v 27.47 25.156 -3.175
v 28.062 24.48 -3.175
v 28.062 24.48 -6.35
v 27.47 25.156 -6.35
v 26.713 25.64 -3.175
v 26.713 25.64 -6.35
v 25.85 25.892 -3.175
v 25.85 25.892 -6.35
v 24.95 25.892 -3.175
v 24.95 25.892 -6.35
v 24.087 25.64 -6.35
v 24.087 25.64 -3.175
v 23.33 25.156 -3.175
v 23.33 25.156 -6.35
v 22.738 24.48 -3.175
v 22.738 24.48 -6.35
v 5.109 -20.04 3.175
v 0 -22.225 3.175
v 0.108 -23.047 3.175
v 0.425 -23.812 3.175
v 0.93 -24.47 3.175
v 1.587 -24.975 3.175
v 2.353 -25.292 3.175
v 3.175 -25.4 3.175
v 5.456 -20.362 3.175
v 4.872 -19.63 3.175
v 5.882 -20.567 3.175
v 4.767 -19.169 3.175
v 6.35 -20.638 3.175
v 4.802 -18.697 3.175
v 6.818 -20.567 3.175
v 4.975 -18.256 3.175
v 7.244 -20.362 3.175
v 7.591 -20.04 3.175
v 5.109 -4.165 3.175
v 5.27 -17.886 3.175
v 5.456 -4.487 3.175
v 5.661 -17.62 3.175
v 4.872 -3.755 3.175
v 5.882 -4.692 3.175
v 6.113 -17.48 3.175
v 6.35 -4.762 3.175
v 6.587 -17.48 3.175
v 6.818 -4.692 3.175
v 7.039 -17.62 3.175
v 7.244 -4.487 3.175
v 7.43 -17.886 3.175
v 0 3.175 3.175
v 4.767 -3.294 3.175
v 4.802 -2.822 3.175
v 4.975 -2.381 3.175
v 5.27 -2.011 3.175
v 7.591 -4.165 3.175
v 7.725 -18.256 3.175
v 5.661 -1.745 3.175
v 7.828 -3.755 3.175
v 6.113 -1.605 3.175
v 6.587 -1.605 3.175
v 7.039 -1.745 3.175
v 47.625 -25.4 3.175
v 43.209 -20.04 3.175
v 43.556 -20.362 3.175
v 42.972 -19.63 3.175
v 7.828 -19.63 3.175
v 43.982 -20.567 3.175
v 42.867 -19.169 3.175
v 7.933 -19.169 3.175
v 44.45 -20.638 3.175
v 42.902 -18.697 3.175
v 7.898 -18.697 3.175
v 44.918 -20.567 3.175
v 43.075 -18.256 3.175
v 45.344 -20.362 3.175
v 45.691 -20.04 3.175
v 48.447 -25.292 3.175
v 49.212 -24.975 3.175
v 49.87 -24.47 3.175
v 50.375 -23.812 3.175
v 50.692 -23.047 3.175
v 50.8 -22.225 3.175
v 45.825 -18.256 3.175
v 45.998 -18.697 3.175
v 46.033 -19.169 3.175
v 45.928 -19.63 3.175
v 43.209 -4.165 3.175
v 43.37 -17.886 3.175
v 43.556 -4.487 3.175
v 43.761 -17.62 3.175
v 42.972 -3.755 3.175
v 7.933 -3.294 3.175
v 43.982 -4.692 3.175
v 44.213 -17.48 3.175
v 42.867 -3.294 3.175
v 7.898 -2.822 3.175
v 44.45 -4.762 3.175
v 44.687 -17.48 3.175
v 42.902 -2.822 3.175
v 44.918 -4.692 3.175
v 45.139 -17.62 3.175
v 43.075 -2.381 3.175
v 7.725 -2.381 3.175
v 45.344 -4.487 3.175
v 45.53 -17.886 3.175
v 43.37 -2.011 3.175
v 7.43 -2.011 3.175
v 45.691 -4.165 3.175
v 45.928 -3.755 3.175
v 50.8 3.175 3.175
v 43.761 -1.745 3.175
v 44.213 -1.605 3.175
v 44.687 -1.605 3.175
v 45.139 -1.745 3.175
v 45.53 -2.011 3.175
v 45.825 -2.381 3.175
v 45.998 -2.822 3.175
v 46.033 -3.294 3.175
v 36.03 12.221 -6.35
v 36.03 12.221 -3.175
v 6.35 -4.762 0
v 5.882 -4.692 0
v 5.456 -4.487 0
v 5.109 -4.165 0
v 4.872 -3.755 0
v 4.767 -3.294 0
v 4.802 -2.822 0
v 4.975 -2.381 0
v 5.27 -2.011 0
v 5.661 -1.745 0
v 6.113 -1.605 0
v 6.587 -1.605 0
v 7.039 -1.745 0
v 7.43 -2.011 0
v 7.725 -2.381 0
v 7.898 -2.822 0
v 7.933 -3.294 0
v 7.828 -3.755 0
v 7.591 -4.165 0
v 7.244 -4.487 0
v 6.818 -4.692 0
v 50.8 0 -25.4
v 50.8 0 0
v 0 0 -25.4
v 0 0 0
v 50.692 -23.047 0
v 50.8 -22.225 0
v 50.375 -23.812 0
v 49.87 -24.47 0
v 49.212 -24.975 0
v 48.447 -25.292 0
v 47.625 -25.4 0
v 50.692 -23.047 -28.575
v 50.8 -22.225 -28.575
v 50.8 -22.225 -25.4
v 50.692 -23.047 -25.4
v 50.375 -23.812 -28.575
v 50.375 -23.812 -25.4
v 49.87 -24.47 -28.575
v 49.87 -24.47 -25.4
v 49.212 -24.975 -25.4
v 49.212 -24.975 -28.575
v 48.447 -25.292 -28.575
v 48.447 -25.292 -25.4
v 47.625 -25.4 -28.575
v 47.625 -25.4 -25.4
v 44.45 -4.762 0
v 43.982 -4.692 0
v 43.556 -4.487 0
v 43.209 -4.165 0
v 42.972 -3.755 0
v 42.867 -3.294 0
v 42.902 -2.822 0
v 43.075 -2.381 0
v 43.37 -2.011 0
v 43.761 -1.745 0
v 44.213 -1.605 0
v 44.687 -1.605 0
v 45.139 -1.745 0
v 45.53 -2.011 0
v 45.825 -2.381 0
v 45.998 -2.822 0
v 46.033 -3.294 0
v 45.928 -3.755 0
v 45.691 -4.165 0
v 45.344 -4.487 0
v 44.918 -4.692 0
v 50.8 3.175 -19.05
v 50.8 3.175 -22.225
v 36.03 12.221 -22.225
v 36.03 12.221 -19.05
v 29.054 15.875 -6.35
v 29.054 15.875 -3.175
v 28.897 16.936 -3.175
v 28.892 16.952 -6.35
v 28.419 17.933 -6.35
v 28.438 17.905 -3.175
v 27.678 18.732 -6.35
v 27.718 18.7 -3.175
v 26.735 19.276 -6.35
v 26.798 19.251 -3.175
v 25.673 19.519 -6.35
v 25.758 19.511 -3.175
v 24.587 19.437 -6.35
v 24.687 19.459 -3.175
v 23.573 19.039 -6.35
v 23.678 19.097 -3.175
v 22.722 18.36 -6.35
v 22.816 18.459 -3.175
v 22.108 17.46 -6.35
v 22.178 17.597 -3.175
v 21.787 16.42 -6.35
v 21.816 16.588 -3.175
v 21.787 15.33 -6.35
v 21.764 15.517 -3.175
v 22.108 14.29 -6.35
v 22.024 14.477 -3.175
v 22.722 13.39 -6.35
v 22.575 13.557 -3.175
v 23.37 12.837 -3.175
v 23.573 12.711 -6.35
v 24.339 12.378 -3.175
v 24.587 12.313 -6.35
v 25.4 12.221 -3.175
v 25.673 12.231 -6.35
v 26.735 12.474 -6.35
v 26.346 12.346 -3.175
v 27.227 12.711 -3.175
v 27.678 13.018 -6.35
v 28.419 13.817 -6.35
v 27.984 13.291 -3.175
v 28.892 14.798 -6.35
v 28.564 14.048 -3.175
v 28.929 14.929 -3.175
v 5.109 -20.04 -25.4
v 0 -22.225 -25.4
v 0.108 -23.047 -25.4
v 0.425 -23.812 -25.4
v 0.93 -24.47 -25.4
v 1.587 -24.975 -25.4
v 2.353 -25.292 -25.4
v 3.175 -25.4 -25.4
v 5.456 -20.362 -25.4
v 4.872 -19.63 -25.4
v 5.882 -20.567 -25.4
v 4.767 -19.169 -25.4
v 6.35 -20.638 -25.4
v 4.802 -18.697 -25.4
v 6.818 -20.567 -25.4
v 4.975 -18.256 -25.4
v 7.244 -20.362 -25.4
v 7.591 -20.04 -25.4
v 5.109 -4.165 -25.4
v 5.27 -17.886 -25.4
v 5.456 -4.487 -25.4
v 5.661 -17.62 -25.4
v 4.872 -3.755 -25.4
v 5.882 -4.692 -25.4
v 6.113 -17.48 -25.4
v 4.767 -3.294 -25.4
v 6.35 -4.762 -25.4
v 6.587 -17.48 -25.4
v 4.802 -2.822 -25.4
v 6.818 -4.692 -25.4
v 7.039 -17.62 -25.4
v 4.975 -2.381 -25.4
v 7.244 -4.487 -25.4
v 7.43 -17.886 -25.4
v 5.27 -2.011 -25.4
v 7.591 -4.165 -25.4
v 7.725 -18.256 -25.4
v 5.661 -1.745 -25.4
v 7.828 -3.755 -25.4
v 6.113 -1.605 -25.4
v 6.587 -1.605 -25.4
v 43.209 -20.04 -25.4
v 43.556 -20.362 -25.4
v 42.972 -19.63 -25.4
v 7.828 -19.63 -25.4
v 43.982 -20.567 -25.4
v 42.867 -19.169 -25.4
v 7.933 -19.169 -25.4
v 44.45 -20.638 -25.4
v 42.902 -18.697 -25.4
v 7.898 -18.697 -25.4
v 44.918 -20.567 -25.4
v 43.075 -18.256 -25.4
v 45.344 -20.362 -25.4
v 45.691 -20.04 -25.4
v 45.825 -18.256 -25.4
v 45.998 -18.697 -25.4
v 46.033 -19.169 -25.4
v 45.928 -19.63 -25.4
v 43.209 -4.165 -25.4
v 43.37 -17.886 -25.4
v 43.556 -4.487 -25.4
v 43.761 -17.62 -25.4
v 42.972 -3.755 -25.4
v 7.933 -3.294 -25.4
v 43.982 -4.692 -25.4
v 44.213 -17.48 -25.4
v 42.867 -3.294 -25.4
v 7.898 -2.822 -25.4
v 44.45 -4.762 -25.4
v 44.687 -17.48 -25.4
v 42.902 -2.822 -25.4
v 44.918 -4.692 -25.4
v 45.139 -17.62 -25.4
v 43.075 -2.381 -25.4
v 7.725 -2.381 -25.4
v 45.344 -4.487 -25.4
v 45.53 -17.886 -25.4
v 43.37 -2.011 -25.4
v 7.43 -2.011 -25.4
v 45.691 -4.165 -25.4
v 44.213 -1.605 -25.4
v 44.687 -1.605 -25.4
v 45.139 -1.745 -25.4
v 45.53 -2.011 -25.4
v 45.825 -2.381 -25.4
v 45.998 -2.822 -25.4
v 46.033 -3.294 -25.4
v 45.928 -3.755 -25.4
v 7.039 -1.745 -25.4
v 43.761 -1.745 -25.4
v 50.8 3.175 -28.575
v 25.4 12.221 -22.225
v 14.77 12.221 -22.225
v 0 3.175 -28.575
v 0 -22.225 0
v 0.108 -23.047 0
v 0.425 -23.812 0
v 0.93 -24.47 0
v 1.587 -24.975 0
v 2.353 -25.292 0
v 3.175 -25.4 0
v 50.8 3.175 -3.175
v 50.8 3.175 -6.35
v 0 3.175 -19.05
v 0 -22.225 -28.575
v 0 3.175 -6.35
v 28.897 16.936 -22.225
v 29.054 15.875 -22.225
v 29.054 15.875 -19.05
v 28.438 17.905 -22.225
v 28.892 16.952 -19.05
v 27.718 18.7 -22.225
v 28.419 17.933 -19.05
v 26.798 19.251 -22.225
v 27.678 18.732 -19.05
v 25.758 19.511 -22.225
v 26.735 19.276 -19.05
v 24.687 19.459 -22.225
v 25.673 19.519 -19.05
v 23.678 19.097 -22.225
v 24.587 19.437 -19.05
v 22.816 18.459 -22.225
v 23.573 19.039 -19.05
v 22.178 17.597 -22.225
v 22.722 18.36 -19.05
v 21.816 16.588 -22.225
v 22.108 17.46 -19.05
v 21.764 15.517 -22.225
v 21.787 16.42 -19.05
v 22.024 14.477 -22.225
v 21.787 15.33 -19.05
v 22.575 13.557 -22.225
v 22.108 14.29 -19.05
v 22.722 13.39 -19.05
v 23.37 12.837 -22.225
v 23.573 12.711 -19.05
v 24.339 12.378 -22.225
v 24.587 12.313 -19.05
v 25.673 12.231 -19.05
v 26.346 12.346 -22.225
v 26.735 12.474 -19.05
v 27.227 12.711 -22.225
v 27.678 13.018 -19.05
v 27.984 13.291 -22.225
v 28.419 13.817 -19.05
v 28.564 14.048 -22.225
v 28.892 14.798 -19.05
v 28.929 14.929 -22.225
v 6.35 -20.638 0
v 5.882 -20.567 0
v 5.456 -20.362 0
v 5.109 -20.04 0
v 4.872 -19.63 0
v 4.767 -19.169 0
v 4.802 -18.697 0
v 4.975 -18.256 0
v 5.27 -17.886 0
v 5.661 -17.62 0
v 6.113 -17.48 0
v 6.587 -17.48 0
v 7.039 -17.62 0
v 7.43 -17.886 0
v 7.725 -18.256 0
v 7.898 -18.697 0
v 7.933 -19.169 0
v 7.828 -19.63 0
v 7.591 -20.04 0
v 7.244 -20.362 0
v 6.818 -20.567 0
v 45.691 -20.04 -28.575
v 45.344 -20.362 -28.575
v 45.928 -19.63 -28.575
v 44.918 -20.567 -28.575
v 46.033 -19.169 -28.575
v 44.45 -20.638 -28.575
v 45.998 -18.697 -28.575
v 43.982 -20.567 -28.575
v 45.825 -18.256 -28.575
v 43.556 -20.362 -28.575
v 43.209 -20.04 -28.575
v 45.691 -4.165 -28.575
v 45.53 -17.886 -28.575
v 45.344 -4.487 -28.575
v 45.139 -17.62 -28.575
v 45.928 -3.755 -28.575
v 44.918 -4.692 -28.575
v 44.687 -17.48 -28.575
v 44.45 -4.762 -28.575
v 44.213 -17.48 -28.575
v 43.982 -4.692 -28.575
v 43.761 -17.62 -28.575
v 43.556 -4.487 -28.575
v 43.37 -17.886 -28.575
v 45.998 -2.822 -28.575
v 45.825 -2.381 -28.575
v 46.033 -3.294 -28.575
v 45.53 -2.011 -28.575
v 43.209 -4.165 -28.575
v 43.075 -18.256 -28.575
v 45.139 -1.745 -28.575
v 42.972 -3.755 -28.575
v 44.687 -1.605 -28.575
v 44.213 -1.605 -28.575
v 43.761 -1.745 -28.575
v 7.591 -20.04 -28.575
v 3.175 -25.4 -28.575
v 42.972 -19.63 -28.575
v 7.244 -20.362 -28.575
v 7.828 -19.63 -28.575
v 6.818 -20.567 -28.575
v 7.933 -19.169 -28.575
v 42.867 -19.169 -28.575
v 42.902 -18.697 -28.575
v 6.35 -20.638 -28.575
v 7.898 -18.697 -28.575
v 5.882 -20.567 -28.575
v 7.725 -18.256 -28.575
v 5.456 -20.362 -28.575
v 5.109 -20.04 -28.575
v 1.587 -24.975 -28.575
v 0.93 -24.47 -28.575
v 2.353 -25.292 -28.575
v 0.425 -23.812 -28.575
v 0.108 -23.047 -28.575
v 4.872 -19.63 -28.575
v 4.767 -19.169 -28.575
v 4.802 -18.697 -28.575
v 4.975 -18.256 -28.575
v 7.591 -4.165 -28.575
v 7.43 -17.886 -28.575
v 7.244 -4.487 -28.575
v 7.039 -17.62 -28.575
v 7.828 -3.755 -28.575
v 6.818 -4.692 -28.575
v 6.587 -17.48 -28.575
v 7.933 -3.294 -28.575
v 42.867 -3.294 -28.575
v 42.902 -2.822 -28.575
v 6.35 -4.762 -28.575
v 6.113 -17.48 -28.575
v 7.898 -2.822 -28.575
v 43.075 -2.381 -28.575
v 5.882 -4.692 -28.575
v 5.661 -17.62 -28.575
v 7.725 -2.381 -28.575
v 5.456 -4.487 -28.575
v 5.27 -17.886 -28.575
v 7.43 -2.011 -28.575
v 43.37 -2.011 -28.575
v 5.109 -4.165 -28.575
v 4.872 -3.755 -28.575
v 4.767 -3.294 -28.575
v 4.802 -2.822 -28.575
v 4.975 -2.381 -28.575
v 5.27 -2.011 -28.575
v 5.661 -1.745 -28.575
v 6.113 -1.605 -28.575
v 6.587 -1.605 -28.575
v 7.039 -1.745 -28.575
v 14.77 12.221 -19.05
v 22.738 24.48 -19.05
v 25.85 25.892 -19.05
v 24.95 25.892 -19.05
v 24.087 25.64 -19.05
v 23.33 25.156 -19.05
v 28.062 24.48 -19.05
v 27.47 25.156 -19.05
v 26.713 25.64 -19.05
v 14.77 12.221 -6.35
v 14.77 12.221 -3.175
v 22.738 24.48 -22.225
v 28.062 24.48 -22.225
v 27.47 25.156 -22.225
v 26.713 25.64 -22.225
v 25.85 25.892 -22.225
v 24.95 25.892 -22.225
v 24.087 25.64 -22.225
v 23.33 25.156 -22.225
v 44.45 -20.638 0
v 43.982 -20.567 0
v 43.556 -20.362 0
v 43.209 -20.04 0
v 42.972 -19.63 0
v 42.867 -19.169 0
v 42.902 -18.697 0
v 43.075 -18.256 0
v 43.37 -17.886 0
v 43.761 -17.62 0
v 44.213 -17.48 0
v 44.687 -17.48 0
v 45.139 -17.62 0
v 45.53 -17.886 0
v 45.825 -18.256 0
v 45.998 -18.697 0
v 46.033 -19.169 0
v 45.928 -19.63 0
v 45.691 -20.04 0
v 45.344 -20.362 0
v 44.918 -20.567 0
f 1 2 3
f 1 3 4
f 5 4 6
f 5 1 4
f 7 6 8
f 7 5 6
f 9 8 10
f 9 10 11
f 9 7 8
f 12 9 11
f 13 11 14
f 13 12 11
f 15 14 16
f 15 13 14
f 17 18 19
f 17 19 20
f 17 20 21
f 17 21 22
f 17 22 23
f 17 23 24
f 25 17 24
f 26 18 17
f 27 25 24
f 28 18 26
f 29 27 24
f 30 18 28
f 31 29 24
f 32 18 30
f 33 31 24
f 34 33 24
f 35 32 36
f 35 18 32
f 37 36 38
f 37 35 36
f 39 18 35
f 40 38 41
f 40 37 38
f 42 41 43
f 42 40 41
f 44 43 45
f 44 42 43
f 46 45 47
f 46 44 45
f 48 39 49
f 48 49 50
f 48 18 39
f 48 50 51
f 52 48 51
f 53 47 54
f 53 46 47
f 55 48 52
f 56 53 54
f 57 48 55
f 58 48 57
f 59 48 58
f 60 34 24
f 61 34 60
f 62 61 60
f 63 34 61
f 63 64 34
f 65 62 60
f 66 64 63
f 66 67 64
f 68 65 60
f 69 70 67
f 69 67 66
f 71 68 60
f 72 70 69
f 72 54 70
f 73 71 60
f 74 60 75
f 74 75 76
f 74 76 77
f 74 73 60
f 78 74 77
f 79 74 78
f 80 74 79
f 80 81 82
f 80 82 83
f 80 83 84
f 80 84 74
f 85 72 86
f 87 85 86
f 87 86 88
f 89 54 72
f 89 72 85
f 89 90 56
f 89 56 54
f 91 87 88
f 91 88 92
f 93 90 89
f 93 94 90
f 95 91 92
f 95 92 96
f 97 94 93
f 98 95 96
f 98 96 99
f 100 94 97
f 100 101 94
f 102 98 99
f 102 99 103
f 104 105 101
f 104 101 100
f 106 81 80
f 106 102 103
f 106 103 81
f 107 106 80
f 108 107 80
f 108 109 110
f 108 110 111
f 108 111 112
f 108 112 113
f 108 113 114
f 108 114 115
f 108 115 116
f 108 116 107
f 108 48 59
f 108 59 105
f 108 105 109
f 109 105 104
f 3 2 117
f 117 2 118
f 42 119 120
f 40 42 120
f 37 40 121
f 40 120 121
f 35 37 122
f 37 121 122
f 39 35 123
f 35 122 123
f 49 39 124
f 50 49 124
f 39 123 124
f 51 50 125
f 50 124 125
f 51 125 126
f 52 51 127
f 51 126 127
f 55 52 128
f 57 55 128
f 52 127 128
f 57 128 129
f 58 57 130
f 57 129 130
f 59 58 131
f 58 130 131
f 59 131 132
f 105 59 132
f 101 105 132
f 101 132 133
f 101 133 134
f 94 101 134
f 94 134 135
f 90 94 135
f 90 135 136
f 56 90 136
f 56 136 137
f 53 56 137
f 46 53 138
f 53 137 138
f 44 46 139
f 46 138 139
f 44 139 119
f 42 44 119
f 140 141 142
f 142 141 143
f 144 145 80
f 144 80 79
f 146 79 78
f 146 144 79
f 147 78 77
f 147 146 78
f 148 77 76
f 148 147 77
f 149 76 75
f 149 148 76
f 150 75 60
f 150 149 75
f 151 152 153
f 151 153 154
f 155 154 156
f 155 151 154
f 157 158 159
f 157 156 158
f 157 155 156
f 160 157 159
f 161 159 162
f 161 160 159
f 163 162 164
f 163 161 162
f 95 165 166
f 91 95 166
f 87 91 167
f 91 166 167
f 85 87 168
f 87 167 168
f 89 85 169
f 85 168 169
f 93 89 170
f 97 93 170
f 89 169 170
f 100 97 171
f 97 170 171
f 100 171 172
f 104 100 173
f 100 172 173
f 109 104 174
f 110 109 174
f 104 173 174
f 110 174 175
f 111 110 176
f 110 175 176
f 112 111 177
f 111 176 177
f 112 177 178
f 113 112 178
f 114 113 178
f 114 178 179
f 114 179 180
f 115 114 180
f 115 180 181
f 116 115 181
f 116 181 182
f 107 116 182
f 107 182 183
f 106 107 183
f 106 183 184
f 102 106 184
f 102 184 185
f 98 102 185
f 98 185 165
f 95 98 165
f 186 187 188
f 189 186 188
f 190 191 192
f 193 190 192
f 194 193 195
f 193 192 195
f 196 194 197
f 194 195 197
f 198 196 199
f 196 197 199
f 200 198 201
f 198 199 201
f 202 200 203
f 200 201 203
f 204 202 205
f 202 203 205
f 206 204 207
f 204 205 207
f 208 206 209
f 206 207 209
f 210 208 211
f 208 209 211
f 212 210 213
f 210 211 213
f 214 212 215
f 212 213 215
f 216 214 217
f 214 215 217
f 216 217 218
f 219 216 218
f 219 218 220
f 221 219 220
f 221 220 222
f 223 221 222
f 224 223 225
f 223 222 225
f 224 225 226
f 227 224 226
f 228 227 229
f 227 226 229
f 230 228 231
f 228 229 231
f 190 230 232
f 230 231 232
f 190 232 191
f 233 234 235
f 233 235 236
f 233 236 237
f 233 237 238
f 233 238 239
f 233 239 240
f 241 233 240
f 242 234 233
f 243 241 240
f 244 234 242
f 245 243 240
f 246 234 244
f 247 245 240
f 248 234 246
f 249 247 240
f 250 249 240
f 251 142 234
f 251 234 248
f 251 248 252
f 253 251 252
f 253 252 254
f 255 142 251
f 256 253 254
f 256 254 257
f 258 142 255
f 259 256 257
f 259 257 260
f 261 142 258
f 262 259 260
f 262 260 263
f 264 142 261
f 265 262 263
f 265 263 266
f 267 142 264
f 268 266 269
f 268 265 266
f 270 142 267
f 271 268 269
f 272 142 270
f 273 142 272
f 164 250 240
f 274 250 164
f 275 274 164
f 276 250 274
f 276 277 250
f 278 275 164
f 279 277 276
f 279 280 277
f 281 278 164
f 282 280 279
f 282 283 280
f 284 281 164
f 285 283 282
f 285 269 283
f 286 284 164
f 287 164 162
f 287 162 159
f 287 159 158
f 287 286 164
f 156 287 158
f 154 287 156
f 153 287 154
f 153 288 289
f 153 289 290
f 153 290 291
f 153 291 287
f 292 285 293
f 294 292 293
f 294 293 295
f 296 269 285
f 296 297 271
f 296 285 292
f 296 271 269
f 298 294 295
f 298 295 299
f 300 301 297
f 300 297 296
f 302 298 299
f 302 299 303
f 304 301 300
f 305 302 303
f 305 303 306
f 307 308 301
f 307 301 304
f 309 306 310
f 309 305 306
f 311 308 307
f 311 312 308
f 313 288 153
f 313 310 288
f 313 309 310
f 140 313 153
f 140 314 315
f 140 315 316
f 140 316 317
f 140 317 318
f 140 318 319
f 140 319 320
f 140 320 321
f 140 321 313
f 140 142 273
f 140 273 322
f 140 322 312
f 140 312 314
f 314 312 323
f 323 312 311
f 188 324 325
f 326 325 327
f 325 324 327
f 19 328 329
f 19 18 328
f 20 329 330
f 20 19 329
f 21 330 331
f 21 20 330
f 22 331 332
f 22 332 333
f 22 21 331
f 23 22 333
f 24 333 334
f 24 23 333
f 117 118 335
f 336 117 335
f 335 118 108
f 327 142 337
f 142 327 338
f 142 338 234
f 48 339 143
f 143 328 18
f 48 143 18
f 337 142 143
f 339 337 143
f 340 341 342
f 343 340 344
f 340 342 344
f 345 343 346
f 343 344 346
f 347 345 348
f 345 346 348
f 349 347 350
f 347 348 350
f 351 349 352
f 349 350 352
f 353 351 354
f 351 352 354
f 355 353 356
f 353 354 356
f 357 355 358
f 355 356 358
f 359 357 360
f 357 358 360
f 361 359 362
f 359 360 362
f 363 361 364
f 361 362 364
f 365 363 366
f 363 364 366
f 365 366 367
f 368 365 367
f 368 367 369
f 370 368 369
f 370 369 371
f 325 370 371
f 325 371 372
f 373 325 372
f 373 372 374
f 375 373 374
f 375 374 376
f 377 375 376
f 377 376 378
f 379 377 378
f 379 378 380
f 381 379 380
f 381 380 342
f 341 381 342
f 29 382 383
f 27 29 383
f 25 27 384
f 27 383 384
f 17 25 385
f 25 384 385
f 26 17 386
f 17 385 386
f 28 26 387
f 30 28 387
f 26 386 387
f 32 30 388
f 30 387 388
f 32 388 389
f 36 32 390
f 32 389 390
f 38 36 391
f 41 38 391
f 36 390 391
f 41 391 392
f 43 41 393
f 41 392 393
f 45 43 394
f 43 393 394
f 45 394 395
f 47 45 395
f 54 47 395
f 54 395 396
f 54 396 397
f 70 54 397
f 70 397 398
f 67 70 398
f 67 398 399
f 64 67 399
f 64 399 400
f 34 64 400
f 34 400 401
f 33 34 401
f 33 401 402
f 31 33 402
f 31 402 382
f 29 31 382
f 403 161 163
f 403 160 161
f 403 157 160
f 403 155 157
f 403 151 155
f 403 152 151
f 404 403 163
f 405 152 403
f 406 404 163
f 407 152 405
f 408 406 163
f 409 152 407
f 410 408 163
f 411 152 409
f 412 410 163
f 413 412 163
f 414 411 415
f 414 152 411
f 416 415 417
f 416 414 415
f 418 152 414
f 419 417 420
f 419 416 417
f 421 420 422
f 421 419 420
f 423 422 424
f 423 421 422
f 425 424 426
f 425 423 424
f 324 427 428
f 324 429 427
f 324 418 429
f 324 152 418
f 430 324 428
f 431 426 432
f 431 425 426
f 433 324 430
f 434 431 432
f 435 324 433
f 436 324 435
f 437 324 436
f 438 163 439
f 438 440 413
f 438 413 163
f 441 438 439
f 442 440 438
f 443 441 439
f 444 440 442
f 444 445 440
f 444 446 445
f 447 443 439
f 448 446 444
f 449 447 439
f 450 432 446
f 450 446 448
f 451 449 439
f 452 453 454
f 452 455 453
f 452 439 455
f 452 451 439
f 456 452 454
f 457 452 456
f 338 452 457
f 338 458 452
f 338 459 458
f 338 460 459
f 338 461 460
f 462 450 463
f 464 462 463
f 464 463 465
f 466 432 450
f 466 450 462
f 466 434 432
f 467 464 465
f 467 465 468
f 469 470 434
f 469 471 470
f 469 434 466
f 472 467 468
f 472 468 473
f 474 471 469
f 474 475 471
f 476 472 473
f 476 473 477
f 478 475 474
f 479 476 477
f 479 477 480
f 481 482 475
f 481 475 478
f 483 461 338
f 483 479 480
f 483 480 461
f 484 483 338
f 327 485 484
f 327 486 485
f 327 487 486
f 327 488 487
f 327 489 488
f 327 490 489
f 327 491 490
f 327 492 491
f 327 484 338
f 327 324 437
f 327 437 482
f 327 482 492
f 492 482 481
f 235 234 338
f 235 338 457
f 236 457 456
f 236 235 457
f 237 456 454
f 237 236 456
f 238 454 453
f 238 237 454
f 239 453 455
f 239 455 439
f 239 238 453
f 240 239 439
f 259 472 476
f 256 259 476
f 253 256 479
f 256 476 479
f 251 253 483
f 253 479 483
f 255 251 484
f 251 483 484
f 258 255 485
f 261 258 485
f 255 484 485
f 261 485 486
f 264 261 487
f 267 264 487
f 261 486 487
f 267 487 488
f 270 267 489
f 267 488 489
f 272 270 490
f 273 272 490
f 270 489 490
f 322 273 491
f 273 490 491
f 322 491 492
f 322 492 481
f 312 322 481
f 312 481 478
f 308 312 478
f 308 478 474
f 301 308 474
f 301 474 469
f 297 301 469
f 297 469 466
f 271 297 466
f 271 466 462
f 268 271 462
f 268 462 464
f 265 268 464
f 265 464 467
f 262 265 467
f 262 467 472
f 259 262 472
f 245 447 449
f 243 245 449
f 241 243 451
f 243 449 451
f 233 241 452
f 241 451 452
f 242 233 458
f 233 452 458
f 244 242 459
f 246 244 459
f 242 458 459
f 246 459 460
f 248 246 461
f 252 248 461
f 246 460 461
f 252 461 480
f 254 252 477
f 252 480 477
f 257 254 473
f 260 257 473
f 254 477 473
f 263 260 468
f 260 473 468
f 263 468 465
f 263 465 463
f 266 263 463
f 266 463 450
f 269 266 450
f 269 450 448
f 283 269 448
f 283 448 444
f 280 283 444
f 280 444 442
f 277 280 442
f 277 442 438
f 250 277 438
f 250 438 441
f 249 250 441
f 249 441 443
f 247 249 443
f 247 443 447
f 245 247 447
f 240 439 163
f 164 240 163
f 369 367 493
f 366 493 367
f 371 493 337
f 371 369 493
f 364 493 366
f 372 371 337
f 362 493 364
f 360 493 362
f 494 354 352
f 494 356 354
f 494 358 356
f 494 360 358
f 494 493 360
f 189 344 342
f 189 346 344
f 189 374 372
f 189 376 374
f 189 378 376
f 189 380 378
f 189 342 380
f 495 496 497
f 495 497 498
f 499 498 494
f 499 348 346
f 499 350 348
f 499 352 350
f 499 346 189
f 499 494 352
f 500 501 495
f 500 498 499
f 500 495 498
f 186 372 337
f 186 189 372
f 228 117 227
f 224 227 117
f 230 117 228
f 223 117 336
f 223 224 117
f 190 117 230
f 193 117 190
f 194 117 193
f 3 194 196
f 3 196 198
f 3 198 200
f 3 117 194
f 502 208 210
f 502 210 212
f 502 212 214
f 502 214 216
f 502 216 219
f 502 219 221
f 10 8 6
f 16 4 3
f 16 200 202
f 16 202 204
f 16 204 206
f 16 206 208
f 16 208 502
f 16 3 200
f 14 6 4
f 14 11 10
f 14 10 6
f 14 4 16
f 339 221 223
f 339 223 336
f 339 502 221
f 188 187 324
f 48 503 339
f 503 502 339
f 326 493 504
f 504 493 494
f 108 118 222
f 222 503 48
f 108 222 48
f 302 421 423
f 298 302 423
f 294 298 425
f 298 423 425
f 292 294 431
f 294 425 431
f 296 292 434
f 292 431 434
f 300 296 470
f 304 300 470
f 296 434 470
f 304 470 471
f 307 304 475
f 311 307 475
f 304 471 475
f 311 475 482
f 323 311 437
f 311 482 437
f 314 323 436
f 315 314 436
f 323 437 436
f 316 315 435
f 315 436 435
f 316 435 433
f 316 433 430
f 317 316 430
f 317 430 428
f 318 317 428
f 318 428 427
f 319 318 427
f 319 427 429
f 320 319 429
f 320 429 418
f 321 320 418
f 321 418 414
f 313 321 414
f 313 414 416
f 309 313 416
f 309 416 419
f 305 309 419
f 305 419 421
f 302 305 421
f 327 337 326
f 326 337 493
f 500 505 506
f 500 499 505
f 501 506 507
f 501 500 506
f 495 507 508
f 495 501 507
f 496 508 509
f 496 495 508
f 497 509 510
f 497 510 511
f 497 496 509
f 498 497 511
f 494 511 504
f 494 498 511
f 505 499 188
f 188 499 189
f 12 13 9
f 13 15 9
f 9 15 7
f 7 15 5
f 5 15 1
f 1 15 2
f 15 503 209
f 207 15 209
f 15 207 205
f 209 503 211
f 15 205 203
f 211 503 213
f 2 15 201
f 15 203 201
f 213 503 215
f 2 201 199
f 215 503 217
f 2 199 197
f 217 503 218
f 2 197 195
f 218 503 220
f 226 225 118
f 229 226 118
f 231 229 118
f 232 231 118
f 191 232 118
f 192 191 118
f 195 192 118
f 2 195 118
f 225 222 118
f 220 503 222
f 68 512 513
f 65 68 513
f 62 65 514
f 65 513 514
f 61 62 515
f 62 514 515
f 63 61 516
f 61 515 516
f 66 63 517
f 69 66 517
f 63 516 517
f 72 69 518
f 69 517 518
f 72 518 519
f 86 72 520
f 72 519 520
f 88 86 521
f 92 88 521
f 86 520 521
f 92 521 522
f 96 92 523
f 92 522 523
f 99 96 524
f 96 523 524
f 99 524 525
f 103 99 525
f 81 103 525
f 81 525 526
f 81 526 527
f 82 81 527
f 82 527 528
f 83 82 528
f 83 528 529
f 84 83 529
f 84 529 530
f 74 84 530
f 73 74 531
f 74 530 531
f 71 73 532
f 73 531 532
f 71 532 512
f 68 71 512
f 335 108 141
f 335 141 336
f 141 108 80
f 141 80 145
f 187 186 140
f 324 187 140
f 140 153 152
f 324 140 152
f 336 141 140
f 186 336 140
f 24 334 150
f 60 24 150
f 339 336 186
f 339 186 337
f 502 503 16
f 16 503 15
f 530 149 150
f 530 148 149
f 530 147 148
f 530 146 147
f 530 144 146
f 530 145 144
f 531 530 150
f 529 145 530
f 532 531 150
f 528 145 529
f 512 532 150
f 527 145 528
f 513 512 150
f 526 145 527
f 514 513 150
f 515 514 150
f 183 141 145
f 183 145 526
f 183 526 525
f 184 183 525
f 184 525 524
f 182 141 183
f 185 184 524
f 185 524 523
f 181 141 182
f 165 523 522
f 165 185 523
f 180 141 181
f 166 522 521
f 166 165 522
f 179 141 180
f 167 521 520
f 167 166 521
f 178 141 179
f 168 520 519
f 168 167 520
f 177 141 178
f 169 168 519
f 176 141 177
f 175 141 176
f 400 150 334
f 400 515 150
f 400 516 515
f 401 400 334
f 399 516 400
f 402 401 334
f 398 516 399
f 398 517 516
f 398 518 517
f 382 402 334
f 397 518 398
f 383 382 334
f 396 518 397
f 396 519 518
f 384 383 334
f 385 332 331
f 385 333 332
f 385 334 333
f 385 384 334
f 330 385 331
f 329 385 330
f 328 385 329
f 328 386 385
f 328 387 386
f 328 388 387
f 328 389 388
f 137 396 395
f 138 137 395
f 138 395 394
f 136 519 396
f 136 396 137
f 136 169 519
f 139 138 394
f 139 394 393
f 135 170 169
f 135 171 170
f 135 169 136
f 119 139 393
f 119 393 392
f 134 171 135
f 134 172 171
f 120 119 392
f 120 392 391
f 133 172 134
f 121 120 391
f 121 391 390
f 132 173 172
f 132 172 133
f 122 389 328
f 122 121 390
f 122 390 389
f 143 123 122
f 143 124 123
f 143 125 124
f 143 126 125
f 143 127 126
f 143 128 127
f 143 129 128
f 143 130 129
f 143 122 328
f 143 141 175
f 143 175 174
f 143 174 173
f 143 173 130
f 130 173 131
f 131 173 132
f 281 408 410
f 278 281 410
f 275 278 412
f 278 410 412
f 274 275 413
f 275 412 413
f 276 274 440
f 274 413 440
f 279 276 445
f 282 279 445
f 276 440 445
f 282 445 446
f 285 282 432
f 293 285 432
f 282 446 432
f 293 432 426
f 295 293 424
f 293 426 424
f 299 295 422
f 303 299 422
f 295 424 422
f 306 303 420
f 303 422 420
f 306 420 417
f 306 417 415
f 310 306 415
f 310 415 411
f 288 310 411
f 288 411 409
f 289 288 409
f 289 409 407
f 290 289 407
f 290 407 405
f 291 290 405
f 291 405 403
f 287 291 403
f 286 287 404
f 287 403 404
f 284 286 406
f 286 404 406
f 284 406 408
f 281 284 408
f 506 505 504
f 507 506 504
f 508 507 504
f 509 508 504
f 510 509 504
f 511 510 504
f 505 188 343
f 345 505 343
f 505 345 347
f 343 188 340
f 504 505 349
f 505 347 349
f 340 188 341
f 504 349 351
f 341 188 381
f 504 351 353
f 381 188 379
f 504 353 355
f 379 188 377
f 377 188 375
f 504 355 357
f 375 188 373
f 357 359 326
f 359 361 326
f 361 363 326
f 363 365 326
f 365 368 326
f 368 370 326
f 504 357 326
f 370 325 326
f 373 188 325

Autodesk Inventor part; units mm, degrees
ref_plane "YZ Plane" through (0, 0, 0) normal (1, 0, 0) x (0, 1, 0)
ref_plane "XZ Plane" through (0, 0, 0) normal (0, 1, 0) x (-1, 0, 0)
ref_plane "XY Plane" through (0, 0, 0) normal (0, 0, 1) x (1, 0, 0)
sketch "Sketch1" plane through (0, 0, 0) normal (0, 1, 0) x (-1, 0, 0)
  line L0 (0, 0) -> (-50.8, 0)
  line L1 (-50.8, 0) -> (-50.8, -25.4)
  line L2 (-50.8, -25.4) -> (0, -25.4)
  line L3 (0, -25.4) -> (0, 0)
  dimension "d0" = 50.8
  dimension "d1" = 25.4
extrude "Extrusion1" add sketch "Sketch1" along normal blind 3.175
sketch "Sketch2" plane through (0, 3.175, 0) normal (0, 1, 0) x (1, 0, 0)
  line L0 (8.89, 3.175) -> (41.91, 3.175)
  line L1 (41.91, 3.175) -> (41.91, 6.35)
  line L2 (41.91, 6.35) -> (8.89, 6.35)
  line L3 (8.89, 6.35) -> (8.89, 3.175)
  line L4 (8.89, 19.05) -> (41.91, 19.05)
  line L5 (41.91, 19.05) -> (41.91, 22.225)
  line L6 (41.91, 22.225) -> (8.89, 22.225)
  line L7 (8.89, 22.225) -> (8.89, 19.05)
  line L8 (0, 25.4) -> (0, 0) projected
  line L9 (50.8, 0) -> (50.8, 25.4) projected
  line L10 (50.8, 25.4) -> (0, 25.4) projected
  point P0 (41.91, 20.6375)
  point P1 (41.91, 4.7625)
  point P2 (8.89, 20.6375)
  point P3 (8.89, 4.7625)
  dimension "d4" = 8.89
  dimension "d5" = 8.89
  dimension "d6" = 3.175
  dimension "d7" = 12.7
  dimension "d8" = 3.175
extrude "Extrusion2" add sketch "Sketch2" along normal blind 38.1
sketch "Sketch3" plane through (8.89, 3.175, -3.175) normal (0, 0, 1) x (1, 0, 0)
  line L0 (0, 0) -> (0, 38.1) projected
  line L1 (0, 0) -> (13.8479, 21.3045)
  line L2 (19.1721, 21.3045) -> (33.02, 0)
  line L3 (33.02, 0) -> (33.02, 38.1) projected
  line L4 (-8.89, 0) -> (41.91, 0) projected
  arc A0 (19.1721, 21.3045) -> (13.8479, 21.3045) centre (16.51, 19.5742) ccw
  line L5 (33.02, 38.1) -> (0, 38.1) projected
  line L6 (0, 38.1) -> (33.02, 38.1)
  point P0 (-8.89, -3.175)
  point P1 (16.51, 25.4)
  dimension "d11" = 25.4
  dimension "d12" = 3.175
extrude "Extrusion3" cut sketch "Sketch3" against normal blind 38.1 contours L0 L5 L3 L2 A0 L1
sketch "Sketch4" plane through (8.89, 3.175, -3.175) normal (0, 0, 1) x (1, 0, 0)
  circle A0 centre (16.51, 12.7) radius 3.6539
  line L0 (-8.89, 0) -> (41.91, 0) projected
  point P0 (-8.89, -3.175)
  point P1 (16.51, 0)
  dimension "d15" = 12.7
extrude "Extrusion4" cut sketch "Sketch4" against normal blind 38.1
sketch "Sketch6" plane through (0, 3.175, 0) normal (0, 1, 0) x (1, 0, 0)
  line L0 (50.8, 0) -> (0, 0)
  line L1 (0, 0) -> (0, -3.175)
  line L2 (0, -3.175) -> (50.8, -3.175)
  line L3 (50.8, -3.175) -> (50.8, 0)
  line L4 (50.8, 28.575) -> (0, 28.575)
  line L5 (0, 28.575) -> (0, 25.4)
  line L6 (0, 25.4) -> (50.8, 25.4)
  line L7 (50.8, 25.4) -> (50.8, 28.575)
  line L8 (50.8, 0) -> (50.8, 25.4) projected
  line L9 (0, 25.4) -> (0, 0) projected
  point P0 (50.8, -1.5875)
  point P1 (50.8, 26.9875)
  point P2 (0, -1.5875)
  point P3 (0, 26.9875)
  point P4 (25.4, 0)
  point P5 (0, 12.7)
  dimension "d26" = 0
  dimension "d27" = 3.175
extrude "Extrusion5" add sketch "Sketch6" against normal blind 28.575 contours L3 L2 L1 L0 | L6 L5 L4 L7
sketch "Sketch7" plane through (0, 3.175, 3.175) normal (0, 0, 1) x (1, 0, 0)
  line L0 (0, 0) -> (50.8, 0) construction
  line L1 (0, 0) -> (0, -28.575) construction
  line L2 (50.8, -28.575) -> (0, -28.575) construction
  line L3 (50.8, 0) -> (50.8, -28.575) construction
  line L4 (44.45, -22.225) -> (6.35, -22.225) construction
  line L5 (6.35, -22.225) -> (6.35, -6.35) construction
  line L6 (6.35, -6.35) -> (44.45, -6.35) construction
  line L7 (44.45, -6.35) -> (44.45, -22.225) construction
  point P0 (0, -3.175)
  dimension "d30" = 6.35
hole "Hole2" at (6.35, -3.175, 3.175) at (44.45, -3.175, 3.175) at (44.45, -19.05, 3.175) at (6.35, -19.05, 3.175) direction (0, 0, -1) diameter 3.175 end through all
fillet "Fillet1" radius 3.175 4 edges at (0, -25.4, 1.5875) (0, -25.4, -26.9875) (50.8, -25.4, 1.5875) (50.8, -25.4, -26.9875)
ref_plane "Work Plane1" through (8.89, 3.175, -12.7) normal (0, 0, 1) x (1, 0, 0)
ref_plane "Work Plane2" through (41.91, 3.175, -3.175) normal (1, 0, 0) x (0, 0, -1)
sketch "Sketch8" plane through (41.91, 3.175, -3.175) normal (1, 0, 0) x (0, 0, -1)
  line L0 (0, 0) -> (0, 9.0461)
  line L1 (-6.35, 0) -> (-6.35, -25.4) projected
  line L2 (0, 9.0461) -> (-6.35, 0)
  line L3 (-6.35, 0) -> (0, 0)
  line L4 (0, 9.0461) -> (0, 16.3539) projected
  point P0 (-3.175, -3.175)
extrude "Extrusion6" add sketch "Sketch8" along normal blind 8.89 and the other way blind 41.91
sketch "Sketch10" plane through (14.7699, 12.2211, -3.175) normal (0, 0, -1) x (-1, 0, 0)
  line L0 (-27.1401, -9.0461) -> (-21.2601, 0) projected
  line L1 (-21.2601, 0) -> (-36.0301, -9.0461)
  line L2 (-36.0301, 0) -> (-36.0301, -9.0461) projected
  line L3 (-21.2601, 0) -> (-36.0301, 0)
  line L4 (-36.0301, -9.0461) -> (-36.0301, 0) projected
  line L5 (-36.0301, 0) -> (-36.0301, -9.0461)
  line L6 (0, 0) -> (5.8799, -9.0461) projected
  line L7 (0, 0) -> (14.7699, -9.0461)
  line L8 (14.7699, -9.0461) -> (14.7699, 0) projected
  line L9 (14.7699, -9.0461) -> (14.7699, 0)
  line L10 (14.7699, 0) -> (0, 0)
  point P0 (14.7699, -12.2211)
extrude "Extrusion8" cut sketch "Sketch10" against normal blind 8.89
mirror "Mirror2" about plane through (8.89, 3.175, -12.7) normal (0, 0, 1) of "Extrusion6", "Extrusion8"
sketch "Sketch11" plane through (8.89, 3.175, -3.175) normal (0, 0, -1) x (-1, 0, 0)
  line L0 (8.89, 0) -> (-5.8799, 9.0461) projected
  line L1 (-5.8799, 9.0461) -> (0, 0) projected
  line L2 (8.89, 0) -> (0, 0) projected
  line L3 (-27.1401, 9.0461) -> (-41.91, 0) projected
  line L4 (-33.02, 0) -> (-41.91, 0) projected
  line L5 (-33.02, 0) -> (-27.1401, 9.0461) projected
  point P0 (8.89, -3.175)
extrude "Extrusion9" add sketch "Sketch11" along normal blind 3.175
mirror "Mirror3" about plane through (8.89, 3.175, -12.7) normal (0, 0, 1) of "Extrusion9"
properties part number "Intake - Piston Mount"
